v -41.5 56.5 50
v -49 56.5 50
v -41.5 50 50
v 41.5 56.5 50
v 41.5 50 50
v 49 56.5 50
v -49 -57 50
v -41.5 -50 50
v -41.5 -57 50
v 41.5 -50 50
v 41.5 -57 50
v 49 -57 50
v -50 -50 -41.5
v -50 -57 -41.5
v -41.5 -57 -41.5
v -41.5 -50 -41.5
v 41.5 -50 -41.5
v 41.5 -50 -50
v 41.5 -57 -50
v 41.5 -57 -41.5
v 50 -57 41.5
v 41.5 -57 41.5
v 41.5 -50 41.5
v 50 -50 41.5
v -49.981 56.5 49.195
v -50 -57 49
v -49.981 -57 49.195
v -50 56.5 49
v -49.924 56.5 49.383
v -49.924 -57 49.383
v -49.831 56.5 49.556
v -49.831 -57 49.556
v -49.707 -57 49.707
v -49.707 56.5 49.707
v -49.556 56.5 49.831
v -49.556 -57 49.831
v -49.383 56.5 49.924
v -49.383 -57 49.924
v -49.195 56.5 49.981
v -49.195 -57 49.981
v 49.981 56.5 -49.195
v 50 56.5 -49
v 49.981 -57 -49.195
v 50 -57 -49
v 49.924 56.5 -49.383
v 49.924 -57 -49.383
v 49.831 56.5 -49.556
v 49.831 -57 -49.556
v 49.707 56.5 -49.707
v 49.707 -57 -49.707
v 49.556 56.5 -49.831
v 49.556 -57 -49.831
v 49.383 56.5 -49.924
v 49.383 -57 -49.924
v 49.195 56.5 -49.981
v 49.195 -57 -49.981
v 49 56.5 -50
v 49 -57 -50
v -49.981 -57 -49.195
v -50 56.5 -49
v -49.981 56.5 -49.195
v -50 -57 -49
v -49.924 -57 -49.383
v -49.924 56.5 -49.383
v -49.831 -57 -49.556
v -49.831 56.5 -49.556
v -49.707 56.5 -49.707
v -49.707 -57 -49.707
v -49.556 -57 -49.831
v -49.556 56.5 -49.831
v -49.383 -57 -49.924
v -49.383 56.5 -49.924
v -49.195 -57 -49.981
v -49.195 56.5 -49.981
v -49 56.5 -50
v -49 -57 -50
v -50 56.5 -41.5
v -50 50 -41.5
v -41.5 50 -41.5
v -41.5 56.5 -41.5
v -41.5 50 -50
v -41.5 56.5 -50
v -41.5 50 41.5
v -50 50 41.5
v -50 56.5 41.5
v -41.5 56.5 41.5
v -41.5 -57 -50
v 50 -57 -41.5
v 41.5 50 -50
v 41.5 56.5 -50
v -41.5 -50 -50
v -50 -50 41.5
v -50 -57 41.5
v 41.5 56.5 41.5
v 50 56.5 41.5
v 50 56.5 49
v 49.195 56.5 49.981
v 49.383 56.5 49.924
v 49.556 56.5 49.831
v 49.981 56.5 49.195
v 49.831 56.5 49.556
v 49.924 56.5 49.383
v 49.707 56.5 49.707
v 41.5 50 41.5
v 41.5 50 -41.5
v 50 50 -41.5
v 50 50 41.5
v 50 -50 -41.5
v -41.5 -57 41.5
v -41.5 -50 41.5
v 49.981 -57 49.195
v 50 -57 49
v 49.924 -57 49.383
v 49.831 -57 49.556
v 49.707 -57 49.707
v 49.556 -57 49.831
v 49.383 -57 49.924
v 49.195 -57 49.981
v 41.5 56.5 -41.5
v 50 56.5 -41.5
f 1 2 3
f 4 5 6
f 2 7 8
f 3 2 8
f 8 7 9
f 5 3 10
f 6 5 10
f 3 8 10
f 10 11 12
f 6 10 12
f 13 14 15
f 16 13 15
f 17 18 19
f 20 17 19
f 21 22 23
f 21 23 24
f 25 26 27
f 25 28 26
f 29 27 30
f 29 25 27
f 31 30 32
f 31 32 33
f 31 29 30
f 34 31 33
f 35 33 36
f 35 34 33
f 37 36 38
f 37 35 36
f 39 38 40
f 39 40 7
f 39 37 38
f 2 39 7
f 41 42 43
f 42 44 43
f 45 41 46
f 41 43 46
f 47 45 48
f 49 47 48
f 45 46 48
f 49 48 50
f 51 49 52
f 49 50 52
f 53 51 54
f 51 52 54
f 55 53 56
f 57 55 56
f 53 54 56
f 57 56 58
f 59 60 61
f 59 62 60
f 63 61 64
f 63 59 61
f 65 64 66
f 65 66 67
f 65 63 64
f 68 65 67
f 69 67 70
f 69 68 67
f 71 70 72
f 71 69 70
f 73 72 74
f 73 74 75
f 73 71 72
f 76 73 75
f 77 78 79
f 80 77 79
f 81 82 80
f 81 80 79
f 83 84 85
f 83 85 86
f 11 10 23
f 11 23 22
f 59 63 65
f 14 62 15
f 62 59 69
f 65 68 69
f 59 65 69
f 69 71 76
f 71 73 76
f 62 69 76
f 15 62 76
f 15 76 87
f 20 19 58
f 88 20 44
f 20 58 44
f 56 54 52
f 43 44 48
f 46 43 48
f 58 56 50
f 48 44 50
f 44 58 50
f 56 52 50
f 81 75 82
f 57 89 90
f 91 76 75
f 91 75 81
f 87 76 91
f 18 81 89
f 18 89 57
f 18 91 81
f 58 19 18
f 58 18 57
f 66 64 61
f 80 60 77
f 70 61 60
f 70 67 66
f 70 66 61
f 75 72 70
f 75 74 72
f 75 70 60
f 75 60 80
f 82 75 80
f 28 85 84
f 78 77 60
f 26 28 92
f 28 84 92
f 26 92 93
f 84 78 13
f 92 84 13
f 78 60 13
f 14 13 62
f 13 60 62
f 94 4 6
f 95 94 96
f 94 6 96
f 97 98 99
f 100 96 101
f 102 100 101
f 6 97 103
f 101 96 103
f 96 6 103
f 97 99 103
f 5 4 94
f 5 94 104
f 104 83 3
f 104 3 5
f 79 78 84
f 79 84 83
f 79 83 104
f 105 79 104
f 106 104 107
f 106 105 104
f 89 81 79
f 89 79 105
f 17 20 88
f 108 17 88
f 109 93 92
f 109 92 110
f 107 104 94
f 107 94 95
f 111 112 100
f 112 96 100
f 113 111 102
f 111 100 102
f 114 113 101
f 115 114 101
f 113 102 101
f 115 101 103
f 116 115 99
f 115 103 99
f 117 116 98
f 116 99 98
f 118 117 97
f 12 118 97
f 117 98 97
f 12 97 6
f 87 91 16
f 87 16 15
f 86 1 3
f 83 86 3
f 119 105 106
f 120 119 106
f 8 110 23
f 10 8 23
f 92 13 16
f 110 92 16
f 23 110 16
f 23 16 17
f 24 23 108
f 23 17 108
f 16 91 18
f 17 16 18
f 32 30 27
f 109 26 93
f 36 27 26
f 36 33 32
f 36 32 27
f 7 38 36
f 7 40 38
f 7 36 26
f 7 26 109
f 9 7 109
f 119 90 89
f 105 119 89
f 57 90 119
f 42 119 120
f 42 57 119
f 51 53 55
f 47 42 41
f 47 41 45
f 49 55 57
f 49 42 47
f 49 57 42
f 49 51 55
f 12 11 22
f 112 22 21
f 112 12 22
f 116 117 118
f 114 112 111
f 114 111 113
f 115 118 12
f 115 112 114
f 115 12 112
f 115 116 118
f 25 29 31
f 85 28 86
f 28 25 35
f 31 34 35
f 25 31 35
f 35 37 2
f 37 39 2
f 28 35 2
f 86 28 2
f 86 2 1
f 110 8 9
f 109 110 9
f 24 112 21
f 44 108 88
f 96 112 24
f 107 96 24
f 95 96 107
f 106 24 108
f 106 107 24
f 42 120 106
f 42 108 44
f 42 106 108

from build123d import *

# Parameters (mm, degrees)
SKETCH1_W           = 100
SKETCH1_H           = 100
BOSS_EXTRUDE1_DEPTH = 50
SKETCH2_W           = 8.5
SKETCH2_H           = 113.5
BOSS_EXTRUDE2_DEPTH = 8.5
FILLET1_R           = 1


with BuildPart() as part:
    # Sketch1 → Boss-Extrude1 (new, symmetric)
    with BuildSketch(Plane(origin=(0, 0, 0), x_dir=(1, 0, 0), z_dir=(0, 1, 0))):
        Rectangle(SKETCH1_W, SKETCH1_H)
    extrude(amount=BOSS_EXTRUDE1_DEPTH, both=True)

    # Sketch2 → Boss-Extrude2 (add)
    with BuildSketch(Plane(origin=(0, 0, 50), x_dir=(1, 0, 0), z_dir=(0, 0, -1))):
        with Locations((-45.75, 0.25)):
            Rectangle(SKETCH2_W, SKETCH2_H)
        with Locations((45.75, 0.25)):
            Rectangle(SKETCH2_W, SKETCH2_H)
    boss_extrude2 = extrude(amount=BOSS_EXTRUDE2_DEPTH)

    # Mirror1: Boss-Extrude2 across plane
    add(boss_extrude2.mirror(Plane.XY))

    # Fillet1
    fillet1_edges = [part.edges().sort_by_distance(p)[0] for p in [
        (50, -0.25, 50),
        (-50, -0.25, 50),
        (-50, -0.25, -50),
        (50, -0.25, -50),
    ]]
    fillet(fillet1_edges, radius=FILLET1_R)


solid = part.part
